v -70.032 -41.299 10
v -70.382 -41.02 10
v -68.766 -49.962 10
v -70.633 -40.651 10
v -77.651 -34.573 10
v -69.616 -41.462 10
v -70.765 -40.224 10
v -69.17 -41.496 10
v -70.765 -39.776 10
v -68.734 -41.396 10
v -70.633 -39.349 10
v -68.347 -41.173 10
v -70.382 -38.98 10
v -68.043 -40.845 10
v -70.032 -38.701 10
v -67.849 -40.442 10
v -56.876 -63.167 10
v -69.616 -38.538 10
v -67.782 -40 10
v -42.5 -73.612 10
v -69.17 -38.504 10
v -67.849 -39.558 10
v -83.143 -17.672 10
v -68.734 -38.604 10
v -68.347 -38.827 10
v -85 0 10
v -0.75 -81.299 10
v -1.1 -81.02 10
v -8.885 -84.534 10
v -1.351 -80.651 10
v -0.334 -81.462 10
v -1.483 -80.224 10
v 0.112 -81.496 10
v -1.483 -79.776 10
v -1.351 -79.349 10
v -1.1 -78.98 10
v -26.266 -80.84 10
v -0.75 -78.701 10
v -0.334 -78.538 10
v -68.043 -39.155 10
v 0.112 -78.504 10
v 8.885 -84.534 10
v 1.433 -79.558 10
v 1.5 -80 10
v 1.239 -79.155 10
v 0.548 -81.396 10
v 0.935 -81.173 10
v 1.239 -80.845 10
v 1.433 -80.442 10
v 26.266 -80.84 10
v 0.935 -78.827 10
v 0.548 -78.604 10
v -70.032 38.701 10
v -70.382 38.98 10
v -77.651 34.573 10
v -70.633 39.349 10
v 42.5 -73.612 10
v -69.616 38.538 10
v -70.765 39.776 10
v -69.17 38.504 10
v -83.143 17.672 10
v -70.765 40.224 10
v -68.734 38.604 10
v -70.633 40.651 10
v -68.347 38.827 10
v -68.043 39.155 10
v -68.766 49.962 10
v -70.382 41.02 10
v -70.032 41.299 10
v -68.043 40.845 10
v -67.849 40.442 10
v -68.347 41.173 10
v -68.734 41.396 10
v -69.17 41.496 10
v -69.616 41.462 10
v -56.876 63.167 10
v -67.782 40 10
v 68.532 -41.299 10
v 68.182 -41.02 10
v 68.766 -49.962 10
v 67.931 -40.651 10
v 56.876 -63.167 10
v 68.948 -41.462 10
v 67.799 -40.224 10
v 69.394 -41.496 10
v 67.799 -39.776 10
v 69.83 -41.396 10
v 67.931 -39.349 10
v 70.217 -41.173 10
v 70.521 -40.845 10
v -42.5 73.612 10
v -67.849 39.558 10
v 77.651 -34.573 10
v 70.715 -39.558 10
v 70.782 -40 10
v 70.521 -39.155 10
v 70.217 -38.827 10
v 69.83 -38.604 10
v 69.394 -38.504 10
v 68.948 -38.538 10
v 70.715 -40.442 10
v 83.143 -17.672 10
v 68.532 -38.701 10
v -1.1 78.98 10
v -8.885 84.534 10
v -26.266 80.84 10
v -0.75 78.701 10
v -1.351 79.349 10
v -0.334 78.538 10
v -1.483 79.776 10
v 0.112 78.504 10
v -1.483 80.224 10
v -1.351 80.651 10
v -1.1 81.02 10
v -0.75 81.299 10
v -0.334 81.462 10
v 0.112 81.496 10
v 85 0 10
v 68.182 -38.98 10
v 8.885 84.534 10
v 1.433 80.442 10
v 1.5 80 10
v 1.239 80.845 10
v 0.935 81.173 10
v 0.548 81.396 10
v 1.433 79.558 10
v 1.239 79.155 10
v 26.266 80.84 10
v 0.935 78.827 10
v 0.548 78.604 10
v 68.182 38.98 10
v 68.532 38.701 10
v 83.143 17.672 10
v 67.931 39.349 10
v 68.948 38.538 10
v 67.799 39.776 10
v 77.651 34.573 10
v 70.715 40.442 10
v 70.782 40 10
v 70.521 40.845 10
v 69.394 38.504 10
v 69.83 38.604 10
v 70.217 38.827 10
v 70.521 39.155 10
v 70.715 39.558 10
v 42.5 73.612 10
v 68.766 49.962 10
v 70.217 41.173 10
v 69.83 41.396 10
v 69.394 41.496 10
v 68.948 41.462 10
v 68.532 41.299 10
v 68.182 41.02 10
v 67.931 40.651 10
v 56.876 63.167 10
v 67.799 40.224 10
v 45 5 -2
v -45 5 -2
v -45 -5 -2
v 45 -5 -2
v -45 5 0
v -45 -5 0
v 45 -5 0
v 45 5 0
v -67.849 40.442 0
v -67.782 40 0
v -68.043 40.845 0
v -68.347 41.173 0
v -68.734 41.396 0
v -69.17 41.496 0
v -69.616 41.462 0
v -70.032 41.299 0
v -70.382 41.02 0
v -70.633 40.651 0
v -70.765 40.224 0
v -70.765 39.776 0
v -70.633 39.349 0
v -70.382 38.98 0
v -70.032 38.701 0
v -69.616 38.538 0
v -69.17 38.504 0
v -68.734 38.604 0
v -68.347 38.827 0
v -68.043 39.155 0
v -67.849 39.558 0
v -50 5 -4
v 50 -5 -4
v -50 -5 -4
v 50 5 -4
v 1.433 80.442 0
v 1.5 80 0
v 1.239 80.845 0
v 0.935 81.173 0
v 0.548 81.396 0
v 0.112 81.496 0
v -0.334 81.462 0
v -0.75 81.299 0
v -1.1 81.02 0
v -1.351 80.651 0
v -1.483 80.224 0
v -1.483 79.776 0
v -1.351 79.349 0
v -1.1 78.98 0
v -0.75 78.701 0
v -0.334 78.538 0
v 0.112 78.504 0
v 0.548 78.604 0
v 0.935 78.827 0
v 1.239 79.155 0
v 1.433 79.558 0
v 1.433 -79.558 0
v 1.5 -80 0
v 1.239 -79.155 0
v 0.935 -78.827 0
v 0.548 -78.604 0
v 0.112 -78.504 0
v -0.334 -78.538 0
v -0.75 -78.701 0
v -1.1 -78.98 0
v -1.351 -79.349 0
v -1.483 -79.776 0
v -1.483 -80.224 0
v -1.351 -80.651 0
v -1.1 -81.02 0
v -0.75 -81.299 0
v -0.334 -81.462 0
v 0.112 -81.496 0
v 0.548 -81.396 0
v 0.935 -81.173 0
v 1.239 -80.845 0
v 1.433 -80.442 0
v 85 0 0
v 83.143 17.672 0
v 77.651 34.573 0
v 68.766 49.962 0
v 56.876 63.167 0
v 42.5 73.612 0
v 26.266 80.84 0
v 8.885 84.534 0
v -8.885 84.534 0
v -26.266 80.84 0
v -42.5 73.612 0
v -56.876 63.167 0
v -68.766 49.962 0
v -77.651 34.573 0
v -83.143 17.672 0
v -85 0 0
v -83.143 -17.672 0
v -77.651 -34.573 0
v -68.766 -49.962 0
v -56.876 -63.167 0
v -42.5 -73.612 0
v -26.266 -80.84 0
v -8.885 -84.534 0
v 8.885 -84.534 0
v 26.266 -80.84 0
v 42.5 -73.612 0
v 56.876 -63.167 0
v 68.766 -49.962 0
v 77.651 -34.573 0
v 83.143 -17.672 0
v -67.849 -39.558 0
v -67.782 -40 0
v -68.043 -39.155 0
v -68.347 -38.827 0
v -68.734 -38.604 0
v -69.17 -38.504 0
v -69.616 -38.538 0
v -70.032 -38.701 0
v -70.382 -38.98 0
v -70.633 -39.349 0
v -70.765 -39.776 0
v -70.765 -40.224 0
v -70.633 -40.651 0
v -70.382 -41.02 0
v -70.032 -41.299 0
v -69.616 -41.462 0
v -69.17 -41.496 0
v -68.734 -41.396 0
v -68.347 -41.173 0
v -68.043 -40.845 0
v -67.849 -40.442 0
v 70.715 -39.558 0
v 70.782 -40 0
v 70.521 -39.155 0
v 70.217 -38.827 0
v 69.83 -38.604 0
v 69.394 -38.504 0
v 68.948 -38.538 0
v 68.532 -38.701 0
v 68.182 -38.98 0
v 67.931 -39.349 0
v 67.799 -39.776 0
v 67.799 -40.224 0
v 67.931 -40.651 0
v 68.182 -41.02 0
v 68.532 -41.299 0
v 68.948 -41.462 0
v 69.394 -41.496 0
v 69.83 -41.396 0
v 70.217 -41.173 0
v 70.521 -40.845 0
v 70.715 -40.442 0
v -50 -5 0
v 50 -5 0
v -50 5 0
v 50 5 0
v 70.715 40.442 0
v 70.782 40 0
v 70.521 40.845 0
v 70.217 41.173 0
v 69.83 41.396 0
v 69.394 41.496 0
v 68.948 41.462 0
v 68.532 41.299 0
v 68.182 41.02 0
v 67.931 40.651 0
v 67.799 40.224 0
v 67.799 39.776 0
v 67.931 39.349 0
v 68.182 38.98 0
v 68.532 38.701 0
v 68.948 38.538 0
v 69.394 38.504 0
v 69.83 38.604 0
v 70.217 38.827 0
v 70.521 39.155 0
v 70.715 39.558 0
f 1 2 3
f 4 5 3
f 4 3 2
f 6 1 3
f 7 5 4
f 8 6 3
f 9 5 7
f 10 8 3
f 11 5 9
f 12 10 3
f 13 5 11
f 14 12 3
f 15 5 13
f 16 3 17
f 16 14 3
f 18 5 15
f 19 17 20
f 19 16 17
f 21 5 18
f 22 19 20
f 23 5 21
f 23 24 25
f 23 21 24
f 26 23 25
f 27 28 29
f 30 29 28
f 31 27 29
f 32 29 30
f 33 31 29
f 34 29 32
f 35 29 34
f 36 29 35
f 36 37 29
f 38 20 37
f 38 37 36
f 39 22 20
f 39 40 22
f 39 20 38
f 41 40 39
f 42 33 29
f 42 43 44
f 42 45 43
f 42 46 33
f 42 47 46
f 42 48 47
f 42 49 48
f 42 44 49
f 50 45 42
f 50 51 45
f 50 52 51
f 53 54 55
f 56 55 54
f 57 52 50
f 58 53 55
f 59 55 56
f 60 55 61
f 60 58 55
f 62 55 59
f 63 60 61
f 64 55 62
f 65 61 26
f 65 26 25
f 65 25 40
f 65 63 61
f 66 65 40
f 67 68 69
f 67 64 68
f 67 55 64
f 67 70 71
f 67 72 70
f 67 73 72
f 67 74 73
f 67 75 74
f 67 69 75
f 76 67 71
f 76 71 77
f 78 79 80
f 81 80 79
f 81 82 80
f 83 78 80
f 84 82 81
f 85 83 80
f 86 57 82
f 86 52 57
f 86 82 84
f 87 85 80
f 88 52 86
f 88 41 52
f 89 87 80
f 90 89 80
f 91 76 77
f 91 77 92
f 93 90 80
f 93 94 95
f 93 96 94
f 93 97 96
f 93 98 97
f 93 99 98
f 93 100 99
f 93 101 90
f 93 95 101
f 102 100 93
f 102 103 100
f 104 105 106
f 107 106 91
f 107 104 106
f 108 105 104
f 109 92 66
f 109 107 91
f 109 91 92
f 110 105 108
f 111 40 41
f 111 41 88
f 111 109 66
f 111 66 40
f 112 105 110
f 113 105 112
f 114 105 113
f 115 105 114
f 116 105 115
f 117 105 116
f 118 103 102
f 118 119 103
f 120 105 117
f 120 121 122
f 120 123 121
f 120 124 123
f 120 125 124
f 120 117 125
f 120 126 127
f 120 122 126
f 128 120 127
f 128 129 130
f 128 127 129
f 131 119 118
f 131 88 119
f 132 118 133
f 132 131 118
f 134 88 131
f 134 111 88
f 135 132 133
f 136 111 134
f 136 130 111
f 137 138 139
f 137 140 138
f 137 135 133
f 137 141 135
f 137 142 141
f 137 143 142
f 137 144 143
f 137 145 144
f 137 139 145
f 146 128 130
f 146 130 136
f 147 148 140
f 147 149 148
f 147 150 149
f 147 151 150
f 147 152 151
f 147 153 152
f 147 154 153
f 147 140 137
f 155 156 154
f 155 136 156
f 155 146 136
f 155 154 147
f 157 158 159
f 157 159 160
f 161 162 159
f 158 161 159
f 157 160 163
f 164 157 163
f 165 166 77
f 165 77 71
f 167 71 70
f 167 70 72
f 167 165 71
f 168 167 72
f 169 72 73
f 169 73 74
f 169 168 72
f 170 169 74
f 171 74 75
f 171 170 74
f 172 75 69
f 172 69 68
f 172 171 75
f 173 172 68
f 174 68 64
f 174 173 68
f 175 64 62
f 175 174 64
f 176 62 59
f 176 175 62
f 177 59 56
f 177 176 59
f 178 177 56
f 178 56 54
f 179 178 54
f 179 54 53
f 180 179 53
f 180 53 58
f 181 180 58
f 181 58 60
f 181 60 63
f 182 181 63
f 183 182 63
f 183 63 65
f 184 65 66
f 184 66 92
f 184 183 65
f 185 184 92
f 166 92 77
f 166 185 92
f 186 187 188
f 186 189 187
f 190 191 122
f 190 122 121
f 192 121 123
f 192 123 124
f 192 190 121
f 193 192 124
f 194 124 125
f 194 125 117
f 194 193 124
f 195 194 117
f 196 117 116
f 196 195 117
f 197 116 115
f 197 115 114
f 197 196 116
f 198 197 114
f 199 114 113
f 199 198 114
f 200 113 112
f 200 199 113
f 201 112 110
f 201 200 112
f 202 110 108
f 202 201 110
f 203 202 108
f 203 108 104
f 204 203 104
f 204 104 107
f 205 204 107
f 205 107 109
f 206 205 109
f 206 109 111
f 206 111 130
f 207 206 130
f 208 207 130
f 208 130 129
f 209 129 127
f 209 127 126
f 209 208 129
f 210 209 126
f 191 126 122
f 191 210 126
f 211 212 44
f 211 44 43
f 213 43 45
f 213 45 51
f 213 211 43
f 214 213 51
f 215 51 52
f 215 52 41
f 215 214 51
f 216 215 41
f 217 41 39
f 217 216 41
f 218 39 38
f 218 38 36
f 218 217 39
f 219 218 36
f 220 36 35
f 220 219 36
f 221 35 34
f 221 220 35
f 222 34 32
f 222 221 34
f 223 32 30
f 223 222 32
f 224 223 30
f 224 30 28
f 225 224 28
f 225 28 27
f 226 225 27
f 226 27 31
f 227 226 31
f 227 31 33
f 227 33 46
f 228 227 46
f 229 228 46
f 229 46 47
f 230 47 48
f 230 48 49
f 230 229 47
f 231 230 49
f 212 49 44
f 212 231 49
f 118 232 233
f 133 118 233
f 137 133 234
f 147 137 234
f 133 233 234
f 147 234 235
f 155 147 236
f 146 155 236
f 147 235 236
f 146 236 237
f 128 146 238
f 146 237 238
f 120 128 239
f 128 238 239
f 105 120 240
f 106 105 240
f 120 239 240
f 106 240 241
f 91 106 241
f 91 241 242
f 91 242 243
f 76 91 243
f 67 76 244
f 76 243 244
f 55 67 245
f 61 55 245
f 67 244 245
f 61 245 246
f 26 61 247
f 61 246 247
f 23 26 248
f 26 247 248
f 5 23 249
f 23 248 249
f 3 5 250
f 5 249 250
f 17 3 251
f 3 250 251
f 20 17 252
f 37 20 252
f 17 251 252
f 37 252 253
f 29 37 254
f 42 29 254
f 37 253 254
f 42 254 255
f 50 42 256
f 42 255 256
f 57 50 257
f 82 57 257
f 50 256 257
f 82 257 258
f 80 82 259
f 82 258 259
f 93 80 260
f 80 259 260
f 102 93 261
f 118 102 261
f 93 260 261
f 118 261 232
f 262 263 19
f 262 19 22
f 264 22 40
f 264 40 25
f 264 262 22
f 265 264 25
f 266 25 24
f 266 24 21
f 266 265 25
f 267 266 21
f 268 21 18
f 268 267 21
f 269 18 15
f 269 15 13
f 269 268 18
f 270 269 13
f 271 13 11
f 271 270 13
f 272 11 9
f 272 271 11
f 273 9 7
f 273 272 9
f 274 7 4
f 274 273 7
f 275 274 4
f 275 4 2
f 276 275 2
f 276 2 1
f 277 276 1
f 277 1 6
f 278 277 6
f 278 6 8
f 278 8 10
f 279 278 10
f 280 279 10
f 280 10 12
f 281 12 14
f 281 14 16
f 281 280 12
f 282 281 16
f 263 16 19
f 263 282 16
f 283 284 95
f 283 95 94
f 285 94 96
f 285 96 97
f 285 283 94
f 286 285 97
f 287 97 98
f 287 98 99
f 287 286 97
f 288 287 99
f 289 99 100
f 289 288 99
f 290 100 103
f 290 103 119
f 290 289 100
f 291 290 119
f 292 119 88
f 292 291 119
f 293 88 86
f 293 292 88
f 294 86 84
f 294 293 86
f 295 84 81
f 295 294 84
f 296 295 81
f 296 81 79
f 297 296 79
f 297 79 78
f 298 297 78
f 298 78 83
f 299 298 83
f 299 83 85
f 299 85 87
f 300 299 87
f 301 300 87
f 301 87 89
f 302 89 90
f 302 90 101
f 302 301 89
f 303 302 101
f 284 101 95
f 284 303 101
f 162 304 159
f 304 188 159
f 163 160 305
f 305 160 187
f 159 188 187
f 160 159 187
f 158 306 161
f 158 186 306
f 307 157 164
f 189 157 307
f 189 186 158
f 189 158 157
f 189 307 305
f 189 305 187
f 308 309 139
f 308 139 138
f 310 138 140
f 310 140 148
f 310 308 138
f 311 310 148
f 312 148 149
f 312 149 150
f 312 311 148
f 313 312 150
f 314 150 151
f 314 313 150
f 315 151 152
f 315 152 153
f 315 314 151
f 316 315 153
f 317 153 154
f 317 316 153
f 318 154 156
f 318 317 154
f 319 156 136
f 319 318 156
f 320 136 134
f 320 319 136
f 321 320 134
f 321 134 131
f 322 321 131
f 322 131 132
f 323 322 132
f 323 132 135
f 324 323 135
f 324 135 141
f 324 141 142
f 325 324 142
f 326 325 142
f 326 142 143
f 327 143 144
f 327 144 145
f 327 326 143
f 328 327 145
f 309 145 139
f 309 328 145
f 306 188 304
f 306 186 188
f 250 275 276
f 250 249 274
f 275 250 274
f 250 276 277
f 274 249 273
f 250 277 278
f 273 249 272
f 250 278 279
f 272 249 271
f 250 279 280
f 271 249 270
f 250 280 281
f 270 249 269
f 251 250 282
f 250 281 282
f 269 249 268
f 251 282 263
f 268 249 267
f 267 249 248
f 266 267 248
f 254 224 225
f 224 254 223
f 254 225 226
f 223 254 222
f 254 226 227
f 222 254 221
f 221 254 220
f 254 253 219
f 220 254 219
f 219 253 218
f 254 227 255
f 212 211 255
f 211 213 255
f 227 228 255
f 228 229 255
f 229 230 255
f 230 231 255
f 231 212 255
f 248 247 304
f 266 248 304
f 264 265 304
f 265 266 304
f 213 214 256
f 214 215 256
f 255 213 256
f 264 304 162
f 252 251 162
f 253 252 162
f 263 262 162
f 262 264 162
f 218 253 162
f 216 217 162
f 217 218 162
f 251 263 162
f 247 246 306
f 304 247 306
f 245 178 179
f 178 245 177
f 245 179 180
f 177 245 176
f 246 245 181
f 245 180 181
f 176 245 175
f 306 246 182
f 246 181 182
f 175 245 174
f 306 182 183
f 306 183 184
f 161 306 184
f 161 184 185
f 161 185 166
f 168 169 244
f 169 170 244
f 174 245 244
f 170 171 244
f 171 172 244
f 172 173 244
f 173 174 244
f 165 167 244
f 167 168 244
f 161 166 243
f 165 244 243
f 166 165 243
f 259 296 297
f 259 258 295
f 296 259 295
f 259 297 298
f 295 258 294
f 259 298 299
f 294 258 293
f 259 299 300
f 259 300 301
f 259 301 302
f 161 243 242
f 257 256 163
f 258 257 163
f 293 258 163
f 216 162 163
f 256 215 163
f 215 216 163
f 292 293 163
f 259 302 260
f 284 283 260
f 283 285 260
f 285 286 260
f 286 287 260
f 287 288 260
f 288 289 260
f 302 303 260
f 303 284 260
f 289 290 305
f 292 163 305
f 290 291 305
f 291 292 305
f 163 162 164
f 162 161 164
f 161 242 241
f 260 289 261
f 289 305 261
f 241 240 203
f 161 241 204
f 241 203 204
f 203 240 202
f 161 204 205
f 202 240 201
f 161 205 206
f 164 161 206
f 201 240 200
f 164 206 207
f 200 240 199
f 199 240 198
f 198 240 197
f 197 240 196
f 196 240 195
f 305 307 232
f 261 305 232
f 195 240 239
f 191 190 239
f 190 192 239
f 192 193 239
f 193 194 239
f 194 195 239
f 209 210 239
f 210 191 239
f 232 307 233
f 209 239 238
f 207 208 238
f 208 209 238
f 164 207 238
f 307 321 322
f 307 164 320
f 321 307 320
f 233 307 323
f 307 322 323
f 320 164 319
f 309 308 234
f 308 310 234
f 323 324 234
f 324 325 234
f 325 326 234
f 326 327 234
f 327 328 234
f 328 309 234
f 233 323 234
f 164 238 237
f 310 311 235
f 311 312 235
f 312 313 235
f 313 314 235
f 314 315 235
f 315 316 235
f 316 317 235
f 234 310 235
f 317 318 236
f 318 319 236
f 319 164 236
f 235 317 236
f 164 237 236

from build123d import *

# Parameters (mm, degrees)
SKETCH1_R           = 85
SKETCH1_R_2         = 1.5
BOSS_EXTRUDE1_DEPTH = 10
BOSS_EXTRUDE2_DEPTH = 5


with BuildPart() as part:
    # Sketch1 → Boss-Extrude1 (new body)
    with BuildSketch(Plane.XY):
        Circle(SKETCH1_R)
        with Locations((0, 80)):
            Circle(SKETCH1_R_2, mode=Mode.SUBTRACT)
        with Locations((69.282032303, 40)):
            Circle(SKETCH1_R_2, mode=Mode.SUBTRACT)
        with Locations((69.282032303, -40)):
            Circle(SKETCH1_R_2, mode=Mode.SUBTRACT)
        with Locations((0, -80)):
            Circle(SKETCH1_R_2, mode=Mode.SUBTRACT)
        with Locations((-69.282032303, -40)):
            Circle(SKETCH1_R_2, mode=Mode.SUBTRACT)
        with Locations((-69.282032303, 40)):
            Circle(SKETCH1_R_2, mode=Mode.SUBTRACT)
    extrude(amount=BOSS_EXTRUDE1_DEPTH)

    # Sketch2 → Boss-Extrude2 (add, symmetric)
    with BuildSketch(Plane(origin=(0, 0, 0), x_dir=(1, 0, 0), z_dir=(0, 1, 0))):
        Polygon((-50, 0), (-45, 0), (-45, 2), (45, 2), (45, 0), (50, 0), (50, 4), (-50, 4), align=None)
    extrude(amount=BOSS_EXTRUDE2_DEPTH, both=True)


solid = part.part
